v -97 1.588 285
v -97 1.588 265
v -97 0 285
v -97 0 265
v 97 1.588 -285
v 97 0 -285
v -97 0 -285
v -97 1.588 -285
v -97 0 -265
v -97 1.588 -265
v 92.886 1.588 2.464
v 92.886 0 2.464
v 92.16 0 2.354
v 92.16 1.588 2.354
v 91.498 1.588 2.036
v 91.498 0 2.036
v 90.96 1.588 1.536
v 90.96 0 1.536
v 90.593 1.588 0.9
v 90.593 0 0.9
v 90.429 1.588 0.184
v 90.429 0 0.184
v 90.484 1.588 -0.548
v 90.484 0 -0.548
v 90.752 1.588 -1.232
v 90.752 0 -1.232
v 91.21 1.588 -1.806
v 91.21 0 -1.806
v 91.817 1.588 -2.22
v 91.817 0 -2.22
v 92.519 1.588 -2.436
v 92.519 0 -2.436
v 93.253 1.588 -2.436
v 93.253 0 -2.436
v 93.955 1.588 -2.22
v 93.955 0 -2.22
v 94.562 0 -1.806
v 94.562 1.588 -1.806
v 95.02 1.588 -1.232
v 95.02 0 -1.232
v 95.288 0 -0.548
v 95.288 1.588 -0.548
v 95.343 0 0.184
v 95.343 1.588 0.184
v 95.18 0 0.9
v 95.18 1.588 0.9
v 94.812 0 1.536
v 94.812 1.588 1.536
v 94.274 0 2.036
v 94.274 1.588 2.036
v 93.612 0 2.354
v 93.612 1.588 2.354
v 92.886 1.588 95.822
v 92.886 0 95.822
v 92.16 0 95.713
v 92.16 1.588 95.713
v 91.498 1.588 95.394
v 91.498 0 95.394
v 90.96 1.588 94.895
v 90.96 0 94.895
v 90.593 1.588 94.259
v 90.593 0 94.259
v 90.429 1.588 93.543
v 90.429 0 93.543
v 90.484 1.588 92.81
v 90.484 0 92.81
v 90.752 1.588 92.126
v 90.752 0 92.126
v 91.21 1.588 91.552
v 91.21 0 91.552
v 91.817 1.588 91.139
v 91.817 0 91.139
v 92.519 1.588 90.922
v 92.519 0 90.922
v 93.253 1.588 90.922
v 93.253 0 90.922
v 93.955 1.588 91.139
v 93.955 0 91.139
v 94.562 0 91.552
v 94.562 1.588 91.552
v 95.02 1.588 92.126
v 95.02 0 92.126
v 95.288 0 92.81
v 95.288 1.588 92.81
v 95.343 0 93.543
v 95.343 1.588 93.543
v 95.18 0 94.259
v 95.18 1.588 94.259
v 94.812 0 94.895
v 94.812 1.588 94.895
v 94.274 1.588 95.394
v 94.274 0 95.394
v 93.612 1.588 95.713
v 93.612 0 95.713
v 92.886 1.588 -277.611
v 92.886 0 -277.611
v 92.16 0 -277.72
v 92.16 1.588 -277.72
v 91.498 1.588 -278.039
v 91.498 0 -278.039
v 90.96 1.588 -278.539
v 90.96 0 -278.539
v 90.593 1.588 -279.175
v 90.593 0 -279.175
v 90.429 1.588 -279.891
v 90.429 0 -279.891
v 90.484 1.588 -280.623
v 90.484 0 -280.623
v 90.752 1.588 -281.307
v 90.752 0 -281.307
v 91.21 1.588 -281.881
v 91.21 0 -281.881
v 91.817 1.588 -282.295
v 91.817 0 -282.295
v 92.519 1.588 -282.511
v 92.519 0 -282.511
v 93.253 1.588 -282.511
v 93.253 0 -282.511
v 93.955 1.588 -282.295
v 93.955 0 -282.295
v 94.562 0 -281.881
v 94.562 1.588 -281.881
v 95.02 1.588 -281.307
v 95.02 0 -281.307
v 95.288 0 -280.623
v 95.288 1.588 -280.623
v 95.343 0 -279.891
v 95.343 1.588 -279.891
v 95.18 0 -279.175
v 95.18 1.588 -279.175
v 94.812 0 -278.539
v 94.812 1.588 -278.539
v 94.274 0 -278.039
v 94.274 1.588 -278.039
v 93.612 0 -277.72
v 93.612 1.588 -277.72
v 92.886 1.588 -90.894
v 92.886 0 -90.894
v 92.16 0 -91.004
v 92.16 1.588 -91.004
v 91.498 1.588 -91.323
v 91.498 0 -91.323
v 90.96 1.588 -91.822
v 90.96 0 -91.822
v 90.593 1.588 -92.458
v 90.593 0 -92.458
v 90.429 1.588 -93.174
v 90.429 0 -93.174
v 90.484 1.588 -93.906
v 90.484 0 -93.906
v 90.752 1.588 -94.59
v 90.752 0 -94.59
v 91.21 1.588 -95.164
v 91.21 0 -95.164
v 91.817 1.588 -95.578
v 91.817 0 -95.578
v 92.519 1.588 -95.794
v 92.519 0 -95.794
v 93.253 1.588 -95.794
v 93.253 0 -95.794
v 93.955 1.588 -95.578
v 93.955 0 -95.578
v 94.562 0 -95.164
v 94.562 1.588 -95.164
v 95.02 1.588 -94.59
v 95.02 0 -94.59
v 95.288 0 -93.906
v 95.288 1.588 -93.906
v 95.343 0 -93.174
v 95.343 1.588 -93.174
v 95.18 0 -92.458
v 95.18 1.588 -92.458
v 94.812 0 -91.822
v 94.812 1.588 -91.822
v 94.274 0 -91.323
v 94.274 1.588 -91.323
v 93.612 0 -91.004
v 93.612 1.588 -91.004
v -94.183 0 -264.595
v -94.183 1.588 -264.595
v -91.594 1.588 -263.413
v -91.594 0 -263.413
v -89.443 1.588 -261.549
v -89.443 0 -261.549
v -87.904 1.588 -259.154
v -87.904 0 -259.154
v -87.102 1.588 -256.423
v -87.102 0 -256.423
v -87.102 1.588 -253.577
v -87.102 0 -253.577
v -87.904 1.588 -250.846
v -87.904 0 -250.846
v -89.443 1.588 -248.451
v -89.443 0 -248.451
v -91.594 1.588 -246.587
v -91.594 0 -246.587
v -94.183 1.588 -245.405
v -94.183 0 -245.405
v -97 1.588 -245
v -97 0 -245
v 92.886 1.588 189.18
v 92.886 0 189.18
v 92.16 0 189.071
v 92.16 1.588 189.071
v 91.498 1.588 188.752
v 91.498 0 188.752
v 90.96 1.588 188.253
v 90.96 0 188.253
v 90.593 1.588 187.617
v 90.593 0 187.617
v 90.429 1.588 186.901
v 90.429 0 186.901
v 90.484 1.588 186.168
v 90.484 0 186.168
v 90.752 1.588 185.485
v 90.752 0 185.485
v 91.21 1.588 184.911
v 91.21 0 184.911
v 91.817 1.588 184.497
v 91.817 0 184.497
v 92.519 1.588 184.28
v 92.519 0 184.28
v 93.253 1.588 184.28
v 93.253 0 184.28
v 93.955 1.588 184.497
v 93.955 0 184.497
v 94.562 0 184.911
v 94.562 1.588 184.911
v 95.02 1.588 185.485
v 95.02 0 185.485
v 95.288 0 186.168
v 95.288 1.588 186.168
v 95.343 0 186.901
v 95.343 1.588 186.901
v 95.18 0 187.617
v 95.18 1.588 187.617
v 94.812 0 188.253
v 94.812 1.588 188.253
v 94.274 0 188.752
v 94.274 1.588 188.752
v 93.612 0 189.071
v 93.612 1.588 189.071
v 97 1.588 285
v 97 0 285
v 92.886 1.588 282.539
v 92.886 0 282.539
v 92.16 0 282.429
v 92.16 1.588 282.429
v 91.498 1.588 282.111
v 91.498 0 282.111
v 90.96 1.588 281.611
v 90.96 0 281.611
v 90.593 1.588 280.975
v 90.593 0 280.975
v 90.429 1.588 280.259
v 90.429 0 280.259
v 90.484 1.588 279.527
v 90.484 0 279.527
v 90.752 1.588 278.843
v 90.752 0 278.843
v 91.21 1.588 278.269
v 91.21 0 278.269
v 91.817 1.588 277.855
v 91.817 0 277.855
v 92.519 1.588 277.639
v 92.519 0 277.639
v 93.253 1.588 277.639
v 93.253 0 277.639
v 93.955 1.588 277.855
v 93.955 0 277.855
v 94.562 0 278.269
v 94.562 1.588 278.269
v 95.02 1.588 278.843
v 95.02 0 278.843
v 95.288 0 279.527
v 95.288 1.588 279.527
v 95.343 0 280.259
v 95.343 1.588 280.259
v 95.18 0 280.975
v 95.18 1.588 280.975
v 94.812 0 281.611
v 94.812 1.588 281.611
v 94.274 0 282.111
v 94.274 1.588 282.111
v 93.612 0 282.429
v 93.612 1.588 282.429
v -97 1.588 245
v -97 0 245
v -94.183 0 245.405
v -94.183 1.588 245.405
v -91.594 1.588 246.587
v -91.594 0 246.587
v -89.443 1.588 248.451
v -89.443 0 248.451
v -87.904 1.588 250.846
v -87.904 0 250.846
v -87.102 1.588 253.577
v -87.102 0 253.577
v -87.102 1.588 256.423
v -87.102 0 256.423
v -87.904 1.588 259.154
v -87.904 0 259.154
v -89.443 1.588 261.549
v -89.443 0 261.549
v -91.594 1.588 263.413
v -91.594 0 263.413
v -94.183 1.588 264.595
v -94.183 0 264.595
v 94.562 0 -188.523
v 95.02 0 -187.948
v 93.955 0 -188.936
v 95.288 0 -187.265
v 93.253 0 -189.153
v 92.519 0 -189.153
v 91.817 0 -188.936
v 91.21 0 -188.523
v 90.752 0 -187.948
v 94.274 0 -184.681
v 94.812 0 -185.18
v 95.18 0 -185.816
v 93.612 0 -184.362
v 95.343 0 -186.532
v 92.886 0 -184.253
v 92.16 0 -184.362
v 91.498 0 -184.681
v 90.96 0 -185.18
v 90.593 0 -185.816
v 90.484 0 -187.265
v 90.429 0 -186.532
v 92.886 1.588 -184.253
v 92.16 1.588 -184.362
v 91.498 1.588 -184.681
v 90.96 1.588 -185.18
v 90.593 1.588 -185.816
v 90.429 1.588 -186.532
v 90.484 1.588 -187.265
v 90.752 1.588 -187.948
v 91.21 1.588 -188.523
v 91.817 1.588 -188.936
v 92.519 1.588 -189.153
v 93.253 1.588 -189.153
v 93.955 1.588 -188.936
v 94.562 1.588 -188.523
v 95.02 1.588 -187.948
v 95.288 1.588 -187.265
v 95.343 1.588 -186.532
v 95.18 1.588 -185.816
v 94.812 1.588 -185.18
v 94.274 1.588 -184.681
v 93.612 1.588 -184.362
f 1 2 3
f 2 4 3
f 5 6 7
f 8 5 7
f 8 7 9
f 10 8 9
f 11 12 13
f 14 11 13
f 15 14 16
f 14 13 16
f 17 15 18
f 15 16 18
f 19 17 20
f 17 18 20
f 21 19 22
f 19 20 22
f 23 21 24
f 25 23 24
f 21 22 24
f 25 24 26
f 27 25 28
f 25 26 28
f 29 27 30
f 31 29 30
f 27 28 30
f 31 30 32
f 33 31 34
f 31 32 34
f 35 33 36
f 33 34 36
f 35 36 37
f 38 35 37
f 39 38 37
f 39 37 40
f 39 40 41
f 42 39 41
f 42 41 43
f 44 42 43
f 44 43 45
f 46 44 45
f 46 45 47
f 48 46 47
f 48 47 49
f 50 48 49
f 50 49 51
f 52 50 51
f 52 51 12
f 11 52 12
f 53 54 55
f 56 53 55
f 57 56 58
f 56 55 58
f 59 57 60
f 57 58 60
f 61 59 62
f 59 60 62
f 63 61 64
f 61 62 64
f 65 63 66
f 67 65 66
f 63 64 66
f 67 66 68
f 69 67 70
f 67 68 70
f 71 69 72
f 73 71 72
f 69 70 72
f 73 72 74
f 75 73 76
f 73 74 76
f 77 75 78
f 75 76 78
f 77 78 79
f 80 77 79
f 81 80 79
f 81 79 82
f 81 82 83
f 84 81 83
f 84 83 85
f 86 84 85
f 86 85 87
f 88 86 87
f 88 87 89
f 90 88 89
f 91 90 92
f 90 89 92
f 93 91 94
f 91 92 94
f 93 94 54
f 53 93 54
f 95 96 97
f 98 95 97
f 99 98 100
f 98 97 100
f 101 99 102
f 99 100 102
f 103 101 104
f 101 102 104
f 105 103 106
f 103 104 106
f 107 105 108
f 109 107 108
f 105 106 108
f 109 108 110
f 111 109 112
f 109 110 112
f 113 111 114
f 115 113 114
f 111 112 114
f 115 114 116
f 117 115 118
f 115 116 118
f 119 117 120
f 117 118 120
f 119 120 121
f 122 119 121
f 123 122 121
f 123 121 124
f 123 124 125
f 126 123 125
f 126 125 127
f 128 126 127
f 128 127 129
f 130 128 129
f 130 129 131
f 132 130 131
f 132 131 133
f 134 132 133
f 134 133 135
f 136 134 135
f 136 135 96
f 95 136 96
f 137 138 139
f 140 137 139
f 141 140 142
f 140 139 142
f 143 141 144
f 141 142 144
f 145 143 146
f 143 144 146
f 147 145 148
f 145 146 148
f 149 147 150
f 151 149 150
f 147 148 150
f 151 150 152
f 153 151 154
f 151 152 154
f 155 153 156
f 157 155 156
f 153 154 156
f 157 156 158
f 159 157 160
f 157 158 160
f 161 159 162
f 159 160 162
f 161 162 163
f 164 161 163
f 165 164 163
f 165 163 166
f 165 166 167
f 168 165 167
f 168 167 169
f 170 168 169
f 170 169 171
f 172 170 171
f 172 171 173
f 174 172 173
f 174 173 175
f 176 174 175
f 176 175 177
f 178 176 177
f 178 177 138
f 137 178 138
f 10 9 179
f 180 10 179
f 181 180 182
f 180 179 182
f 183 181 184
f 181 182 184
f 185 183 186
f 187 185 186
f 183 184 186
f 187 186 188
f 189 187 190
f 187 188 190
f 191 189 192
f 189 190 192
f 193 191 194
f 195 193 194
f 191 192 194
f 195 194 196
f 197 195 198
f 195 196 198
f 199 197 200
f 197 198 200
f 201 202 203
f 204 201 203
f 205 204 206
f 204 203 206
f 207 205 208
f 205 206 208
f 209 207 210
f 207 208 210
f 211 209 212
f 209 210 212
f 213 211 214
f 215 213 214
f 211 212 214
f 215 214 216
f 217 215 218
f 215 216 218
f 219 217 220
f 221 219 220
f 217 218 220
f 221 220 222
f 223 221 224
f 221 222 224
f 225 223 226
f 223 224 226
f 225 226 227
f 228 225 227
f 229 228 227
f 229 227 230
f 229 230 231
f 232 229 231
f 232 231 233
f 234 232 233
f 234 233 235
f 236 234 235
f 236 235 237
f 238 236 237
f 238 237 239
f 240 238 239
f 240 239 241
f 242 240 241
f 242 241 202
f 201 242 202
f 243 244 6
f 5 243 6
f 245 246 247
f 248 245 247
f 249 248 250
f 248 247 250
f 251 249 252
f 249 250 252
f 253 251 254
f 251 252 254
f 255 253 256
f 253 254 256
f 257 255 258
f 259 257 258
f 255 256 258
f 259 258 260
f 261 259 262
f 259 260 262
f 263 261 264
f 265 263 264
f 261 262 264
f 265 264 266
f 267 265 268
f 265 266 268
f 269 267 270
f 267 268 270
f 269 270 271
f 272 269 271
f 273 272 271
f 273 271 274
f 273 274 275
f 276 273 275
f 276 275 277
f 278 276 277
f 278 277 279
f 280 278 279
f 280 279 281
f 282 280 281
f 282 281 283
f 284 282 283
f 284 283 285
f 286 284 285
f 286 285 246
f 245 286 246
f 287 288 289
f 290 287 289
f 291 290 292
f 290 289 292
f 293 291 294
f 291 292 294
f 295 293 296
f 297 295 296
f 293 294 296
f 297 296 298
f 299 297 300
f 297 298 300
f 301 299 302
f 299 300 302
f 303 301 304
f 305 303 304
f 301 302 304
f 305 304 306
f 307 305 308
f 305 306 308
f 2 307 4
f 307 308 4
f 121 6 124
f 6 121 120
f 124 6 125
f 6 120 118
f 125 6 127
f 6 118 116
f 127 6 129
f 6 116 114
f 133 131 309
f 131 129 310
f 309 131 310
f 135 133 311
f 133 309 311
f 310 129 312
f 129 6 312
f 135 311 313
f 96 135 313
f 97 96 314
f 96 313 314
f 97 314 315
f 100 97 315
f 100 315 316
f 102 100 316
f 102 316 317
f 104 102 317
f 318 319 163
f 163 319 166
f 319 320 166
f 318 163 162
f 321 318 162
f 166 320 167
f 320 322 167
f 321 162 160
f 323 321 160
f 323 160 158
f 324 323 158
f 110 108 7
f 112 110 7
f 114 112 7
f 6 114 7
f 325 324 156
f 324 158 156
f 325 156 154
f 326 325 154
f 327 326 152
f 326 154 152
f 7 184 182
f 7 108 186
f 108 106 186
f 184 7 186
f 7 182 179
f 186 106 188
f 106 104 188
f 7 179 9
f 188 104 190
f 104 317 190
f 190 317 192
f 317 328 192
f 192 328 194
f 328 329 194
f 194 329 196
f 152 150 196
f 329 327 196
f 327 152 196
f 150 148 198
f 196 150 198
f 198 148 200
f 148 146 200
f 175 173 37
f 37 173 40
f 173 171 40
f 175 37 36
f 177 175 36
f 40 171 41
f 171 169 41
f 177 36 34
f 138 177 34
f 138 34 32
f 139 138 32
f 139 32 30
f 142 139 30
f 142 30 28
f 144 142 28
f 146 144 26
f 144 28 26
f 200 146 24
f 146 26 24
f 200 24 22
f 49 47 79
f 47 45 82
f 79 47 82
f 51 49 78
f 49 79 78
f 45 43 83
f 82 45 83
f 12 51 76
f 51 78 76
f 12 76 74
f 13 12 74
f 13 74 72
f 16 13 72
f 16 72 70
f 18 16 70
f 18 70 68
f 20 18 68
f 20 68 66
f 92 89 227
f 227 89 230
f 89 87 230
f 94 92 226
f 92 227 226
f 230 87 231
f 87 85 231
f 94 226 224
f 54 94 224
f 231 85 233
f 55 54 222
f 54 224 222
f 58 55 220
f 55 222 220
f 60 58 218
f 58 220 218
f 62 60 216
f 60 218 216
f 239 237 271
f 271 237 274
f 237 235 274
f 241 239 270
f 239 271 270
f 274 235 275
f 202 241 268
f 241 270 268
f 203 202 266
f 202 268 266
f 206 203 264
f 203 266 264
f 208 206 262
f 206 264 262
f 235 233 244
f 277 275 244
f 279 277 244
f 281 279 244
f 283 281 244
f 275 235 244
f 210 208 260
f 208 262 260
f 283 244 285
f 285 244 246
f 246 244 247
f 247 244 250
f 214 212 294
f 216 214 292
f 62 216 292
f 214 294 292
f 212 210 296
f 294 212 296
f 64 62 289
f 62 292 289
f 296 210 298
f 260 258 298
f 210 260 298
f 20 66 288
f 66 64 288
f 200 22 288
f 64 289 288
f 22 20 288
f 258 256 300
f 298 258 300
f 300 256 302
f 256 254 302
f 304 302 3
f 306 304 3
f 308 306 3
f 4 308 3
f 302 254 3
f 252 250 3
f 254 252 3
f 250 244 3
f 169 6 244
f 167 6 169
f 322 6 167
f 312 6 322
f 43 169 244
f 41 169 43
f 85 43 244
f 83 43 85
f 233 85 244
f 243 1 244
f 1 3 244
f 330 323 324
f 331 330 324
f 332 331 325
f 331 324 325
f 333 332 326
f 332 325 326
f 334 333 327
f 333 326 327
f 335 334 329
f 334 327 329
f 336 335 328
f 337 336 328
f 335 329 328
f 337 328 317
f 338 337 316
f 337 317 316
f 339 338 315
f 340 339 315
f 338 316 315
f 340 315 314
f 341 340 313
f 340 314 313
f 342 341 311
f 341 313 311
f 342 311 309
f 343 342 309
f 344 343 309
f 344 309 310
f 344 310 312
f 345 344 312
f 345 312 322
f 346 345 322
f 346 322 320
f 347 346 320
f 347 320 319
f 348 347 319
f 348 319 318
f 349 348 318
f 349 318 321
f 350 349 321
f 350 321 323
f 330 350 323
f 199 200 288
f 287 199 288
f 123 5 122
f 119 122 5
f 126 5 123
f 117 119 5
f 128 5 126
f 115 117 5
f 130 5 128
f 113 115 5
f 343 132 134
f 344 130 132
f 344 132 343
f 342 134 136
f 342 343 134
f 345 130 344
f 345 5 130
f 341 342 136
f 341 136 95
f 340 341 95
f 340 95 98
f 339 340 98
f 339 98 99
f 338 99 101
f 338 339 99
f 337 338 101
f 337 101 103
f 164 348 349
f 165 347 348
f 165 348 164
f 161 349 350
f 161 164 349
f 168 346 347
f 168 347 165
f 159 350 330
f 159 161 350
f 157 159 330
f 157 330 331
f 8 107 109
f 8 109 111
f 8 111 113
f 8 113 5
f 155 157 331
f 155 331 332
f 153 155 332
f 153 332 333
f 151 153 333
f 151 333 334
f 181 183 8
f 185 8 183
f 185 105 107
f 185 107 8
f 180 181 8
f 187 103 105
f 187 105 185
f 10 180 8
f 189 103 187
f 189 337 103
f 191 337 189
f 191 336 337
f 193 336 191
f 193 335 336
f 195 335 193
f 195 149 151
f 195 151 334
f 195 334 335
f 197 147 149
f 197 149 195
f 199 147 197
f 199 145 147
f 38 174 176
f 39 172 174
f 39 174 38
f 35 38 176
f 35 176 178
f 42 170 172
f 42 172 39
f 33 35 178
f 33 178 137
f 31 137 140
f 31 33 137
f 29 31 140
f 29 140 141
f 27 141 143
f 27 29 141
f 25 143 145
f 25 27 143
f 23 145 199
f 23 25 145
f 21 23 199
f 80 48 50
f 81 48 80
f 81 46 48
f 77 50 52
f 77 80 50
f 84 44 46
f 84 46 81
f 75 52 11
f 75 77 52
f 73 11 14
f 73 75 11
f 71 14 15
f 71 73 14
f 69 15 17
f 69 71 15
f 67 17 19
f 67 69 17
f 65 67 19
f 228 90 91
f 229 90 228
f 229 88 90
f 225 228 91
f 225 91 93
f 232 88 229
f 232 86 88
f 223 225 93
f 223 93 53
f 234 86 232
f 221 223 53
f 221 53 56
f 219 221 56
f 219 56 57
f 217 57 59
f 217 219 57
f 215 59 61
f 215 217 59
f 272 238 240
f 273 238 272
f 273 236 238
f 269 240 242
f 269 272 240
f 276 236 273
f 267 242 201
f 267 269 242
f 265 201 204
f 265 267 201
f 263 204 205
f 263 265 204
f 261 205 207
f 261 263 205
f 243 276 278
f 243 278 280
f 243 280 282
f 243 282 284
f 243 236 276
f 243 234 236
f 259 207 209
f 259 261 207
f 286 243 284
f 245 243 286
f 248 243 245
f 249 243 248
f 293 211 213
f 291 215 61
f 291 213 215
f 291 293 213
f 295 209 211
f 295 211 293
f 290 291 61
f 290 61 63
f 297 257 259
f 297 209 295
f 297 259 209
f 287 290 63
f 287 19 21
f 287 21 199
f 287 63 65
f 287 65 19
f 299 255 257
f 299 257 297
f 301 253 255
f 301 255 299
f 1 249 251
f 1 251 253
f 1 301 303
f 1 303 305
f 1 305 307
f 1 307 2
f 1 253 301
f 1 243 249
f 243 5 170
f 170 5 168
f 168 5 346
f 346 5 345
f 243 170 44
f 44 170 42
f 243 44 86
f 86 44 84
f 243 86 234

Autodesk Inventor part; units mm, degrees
ref_plane "YZ Plane" through (0, 0, 0) normal (1, 0, 0) x (0, 1, 0)
ref_plane "XZ Plane" through (0, 0, 0) normal (0, 1, 0) x (-1, 0, 0)
ref_plane "XY Plane" through (0, 0, 0) normal (0, 0, 1) x (1, 0, 0)
sketch "Sketch1" plane through (0, 0, 0) normal (0, 1, 0) x (-1, 0, 0)
  line L0 (97, 285) -> (-97, 285)
  line L1 (-97, 285) -> (-97, -285)
  line L2 (-97, -285) -> (97, -285)
  line L3 (97, -285) -> (97, 285)
  point P0 (0, 0)
  dimension "d0" = 194
  dimension "d1" = 570
  dimension "d2" = 97
  dimension "d3" = 285
extrude "Plate1" add sketch "Sketch1" along normal blind 1.5875
sketch "Sketch4" plane through (0, 1.5875, 0) normal (0, 1, 0) x (1, 0, 0)
  line L0 (97, -285) -> (-97, -285) projected
  line L1 (97, 285) -> (97, -285) projected
  point P0 (0, 0)
  point P1 (92.8862, -280.075)
  dimension "d22" = 4.925
  dimension "d40" = 4.1138
hole "Hole1" at (92.8862, 1.5875, 280.075) direction (0, -1, 0) diameter 4.9276 end through all
pattern_linear "Rectangular Pattern1" count 7 spacing 93.3583 along (0, 0, -1) of "Hole1"
sketch "Sketch5" plane through (0, 1.5875, 0) normal (0, 1, 0) x (1, 0, 0)
  line L0 (-97, -285) -> (-97, 285) projected
  line L1 (-97, 285) -> (97, 285) projected
  line L2 (97, -285) -> (-97, -285) projected
  point P0 (0, 0)
  point P1 (-97, 255)
  point P2 (-97, -255)
  dimension "d35" = 30
  dimension "d36" = 30
hole "Hole2" at (-97, 1.5875, -255) at (-97, 1.5875, 255) direction (0, -1, 0) diameter 20 end through all
equation "\"d20\" = Thickness"
equation "\"d4\" = Thickness"
equation "\"d2\" = 0.5 * d0"
equation "\"d3\" = 0.5 * d1"
equation "\"BendRadius\" = Thickness"
equation "\"BendReliefWidth\" = Thickness"
equation "\"BendReliefDepth\" = 0.5 * Thickness"
equation "\"CornerReliefSize\" = 4 * Thickness"
equation "\"MinimumRemnant\" = 2 * Thickness"
equation "\"TransitionRadius\" = BendRadius"
equation "\"JacobiRadiusSize\" = BendRadius"
equation "\"GapSize\" = Thickness"
equation "\"Thickness\" = 1.5875"
properties part number "CO-1-01-controlsSeperator" material "Aluminum 6061"
